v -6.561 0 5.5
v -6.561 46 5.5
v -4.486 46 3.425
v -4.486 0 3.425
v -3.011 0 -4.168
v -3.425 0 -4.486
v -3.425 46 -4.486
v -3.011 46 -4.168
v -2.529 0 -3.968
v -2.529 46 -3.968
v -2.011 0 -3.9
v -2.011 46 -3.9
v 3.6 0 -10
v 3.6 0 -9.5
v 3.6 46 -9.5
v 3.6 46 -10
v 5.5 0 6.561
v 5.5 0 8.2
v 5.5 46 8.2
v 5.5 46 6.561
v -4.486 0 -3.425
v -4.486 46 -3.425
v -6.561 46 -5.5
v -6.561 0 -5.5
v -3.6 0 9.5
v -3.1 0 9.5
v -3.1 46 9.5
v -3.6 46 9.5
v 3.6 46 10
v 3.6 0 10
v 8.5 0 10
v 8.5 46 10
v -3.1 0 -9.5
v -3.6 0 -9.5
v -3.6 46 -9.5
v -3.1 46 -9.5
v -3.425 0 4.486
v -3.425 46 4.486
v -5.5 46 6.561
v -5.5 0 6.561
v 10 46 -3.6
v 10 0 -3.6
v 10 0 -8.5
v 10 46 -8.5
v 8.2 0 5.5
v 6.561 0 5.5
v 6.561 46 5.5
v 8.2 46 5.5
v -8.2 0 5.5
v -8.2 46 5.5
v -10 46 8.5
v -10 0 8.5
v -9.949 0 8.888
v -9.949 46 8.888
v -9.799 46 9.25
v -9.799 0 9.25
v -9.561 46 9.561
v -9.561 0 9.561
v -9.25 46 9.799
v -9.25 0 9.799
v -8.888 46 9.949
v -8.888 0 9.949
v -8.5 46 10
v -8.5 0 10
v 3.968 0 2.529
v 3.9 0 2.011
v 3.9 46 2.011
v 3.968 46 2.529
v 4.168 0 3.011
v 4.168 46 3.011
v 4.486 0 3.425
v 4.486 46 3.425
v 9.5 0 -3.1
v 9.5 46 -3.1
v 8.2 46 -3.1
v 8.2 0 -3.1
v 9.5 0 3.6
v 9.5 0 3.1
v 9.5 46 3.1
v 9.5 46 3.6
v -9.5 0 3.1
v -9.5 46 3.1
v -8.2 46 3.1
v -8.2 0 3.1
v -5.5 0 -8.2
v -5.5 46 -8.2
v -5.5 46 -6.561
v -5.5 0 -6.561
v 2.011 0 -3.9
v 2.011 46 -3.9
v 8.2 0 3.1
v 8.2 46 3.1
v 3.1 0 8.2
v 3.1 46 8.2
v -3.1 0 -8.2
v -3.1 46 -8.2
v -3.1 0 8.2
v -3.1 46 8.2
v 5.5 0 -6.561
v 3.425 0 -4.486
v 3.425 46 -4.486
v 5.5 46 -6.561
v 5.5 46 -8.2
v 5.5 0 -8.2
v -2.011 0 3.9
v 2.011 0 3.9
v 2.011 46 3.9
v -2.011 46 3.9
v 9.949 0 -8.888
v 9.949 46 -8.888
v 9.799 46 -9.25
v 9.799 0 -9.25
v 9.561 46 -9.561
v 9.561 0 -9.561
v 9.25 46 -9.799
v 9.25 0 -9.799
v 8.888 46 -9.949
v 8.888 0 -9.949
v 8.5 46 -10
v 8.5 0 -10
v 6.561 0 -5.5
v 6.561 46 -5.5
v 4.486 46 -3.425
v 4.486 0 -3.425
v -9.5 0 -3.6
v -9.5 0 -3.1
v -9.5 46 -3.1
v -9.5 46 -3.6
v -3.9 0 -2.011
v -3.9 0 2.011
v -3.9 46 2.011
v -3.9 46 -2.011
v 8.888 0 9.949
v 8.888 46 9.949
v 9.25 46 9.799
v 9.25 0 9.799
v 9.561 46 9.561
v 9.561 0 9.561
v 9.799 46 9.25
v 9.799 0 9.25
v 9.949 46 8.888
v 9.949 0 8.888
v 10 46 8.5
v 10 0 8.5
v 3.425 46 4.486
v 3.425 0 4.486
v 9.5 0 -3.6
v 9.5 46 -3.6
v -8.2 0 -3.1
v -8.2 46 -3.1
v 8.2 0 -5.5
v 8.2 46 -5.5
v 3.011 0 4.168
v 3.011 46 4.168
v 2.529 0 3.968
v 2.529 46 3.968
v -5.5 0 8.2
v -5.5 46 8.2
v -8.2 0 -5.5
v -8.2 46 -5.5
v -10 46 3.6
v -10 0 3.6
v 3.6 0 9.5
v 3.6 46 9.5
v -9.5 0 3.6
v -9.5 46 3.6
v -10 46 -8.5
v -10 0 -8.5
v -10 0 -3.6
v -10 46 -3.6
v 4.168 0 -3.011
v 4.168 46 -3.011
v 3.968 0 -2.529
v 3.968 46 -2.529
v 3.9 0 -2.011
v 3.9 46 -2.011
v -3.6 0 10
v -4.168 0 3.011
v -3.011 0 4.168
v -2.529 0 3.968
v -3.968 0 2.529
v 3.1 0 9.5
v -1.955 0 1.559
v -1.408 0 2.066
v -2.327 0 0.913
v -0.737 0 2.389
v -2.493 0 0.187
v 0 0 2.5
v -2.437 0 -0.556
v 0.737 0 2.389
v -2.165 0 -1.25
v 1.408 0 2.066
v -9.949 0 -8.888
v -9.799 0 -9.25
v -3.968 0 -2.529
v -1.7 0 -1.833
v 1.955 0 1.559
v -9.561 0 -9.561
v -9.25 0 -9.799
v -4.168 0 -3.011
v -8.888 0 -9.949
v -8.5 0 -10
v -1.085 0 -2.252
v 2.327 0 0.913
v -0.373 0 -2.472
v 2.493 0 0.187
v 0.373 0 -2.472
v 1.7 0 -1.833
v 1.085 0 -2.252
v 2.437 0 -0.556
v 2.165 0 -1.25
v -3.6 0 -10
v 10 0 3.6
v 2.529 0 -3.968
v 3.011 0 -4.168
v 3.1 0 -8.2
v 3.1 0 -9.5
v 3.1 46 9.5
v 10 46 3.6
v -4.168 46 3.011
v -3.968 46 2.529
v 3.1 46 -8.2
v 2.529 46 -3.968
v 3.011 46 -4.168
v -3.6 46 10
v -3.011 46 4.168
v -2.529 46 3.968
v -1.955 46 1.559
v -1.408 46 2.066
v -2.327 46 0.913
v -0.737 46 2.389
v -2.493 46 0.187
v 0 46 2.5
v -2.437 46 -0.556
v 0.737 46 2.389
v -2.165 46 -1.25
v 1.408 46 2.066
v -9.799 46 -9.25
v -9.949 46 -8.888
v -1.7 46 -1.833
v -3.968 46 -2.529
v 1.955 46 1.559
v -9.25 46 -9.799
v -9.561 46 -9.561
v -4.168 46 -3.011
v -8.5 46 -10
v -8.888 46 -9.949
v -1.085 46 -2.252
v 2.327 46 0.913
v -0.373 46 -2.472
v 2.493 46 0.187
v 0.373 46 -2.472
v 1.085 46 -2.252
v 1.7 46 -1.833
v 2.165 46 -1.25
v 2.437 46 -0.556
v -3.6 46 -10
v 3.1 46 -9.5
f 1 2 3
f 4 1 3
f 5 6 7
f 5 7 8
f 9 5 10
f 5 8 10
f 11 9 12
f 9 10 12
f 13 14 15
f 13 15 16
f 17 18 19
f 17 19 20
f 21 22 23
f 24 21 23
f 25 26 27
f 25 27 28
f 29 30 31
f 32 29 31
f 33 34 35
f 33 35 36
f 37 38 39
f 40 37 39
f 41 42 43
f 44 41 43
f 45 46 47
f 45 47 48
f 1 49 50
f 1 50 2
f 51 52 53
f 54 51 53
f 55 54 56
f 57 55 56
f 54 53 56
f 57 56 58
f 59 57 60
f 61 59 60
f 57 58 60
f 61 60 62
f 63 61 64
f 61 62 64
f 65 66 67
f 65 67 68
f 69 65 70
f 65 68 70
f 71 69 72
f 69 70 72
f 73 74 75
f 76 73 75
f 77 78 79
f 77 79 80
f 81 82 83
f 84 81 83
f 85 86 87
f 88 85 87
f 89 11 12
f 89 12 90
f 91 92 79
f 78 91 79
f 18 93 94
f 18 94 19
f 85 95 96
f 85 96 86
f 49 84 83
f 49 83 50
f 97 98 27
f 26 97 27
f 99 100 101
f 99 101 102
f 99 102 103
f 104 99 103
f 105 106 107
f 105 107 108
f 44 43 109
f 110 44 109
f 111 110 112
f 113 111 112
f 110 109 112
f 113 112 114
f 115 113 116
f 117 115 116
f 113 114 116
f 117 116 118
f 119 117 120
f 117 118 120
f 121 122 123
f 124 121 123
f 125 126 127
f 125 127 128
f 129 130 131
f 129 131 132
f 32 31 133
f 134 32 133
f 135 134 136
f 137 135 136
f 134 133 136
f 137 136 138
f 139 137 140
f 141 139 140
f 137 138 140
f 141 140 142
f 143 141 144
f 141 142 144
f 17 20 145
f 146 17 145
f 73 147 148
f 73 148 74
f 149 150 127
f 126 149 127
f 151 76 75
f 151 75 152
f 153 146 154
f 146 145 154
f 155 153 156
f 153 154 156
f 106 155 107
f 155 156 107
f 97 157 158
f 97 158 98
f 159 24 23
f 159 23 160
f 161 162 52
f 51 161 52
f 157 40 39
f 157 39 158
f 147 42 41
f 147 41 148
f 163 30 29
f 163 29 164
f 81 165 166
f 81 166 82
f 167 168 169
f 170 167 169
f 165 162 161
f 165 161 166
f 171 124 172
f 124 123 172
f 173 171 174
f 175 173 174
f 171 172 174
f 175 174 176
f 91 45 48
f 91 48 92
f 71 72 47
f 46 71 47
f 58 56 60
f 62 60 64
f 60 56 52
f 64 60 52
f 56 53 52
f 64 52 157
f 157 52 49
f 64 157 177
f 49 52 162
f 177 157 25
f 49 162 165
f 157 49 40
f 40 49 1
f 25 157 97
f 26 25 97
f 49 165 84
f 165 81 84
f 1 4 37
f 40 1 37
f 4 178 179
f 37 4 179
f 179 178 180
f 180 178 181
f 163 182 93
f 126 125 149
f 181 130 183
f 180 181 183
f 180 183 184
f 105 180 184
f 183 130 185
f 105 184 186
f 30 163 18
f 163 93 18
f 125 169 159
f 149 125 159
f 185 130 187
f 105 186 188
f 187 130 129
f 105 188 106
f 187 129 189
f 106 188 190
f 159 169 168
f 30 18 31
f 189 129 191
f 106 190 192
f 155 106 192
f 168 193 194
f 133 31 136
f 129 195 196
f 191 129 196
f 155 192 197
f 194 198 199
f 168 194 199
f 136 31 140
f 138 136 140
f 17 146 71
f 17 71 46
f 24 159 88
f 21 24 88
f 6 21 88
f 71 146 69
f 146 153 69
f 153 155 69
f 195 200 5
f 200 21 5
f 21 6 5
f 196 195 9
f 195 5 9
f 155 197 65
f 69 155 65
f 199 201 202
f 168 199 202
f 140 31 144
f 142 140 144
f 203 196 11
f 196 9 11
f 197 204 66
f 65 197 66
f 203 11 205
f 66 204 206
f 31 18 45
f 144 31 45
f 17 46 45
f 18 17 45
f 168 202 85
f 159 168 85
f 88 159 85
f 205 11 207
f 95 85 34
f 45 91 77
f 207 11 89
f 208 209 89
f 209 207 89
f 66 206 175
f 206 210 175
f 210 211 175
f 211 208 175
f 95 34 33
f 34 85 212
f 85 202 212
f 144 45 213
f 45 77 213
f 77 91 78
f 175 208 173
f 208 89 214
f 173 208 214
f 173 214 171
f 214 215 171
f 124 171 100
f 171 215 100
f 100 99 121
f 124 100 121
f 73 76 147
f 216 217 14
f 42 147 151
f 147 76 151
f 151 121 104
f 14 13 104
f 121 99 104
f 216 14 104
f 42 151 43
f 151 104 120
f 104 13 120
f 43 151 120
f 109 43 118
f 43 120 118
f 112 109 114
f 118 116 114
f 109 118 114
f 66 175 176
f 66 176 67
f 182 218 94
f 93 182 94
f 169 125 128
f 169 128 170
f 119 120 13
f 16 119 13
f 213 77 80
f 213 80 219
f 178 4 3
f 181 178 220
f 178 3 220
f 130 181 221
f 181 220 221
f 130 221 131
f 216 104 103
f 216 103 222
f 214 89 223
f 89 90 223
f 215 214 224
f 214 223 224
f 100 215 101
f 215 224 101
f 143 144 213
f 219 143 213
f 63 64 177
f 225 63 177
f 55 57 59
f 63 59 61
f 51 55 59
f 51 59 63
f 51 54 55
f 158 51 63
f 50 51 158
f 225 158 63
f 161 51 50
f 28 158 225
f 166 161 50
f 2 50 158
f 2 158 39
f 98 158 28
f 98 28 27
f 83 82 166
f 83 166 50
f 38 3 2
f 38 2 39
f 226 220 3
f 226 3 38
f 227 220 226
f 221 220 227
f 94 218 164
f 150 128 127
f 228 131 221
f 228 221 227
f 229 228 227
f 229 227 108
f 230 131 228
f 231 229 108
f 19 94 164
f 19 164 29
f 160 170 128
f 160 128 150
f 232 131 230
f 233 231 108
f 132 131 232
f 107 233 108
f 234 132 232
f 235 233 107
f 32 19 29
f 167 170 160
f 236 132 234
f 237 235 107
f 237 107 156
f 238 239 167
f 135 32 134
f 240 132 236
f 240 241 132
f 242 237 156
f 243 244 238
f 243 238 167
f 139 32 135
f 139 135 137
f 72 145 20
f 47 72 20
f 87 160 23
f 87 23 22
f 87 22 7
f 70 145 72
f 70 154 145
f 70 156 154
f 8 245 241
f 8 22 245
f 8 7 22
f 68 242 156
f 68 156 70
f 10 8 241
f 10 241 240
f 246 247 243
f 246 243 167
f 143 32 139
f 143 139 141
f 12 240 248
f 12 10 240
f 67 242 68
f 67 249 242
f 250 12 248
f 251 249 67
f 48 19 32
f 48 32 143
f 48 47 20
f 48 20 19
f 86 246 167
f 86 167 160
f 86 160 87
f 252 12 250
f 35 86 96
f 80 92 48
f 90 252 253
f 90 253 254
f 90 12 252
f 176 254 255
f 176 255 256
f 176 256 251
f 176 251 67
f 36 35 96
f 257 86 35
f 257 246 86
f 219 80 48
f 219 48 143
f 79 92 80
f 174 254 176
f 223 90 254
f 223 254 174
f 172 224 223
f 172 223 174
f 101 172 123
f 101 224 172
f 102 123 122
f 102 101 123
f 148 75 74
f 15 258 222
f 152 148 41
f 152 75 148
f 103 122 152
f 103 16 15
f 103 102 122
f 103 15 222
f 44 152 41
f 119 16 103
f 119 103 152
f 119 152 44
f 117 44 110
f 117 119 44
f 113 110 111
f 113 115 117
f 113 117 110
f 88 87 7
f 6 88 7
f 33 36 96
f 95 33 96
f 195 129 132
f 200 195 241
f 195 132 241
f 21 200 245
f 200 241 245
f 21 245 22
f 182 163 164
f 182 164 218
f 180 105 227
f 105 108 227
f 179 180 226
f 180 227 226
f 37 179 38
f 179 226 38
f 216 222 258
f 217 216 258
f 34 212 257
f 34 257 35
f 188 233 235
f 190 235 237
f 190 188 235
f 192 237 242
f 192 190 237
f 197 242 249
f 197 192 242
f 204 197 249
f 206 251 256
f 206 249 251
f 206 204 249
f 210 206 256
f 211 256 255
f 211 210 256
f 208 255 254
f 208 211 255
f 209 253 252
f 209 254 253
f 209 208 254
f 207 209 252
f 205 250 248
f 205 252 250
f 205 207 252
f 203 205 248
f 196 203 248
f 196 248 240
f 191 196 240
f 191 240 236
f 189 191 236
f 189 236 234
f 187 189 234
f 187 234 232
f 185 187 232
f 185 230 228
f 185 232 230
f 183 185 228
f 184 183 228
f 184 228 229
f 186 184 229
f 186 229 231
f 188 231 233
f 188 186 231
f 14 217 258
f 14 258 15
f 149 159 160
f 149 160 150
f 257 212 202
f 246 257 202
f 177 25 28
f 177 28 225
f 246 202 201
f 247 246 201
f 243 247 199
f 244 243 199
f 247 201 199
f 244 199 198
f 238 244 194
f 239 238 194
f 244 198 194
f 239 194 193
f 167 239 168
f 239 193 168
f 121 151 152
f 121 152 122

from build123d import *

# Parameters (mm, degrees)
BOSS_EXTRUDE1_DEPTH      = 46
SKETCH4_R                = 2.5
CUT_EXTRUDE2_DEPTH       = 49.124837662
CUT_EXTRUDE1_DEPTH       = 49.124837662
FILLET1_R                = 2
CIRPATTERN1_COUNT        = 4
FILLET1_OF_CIRPATTERN1_R = 2


with BuildPart() as part:
    # Sketch1 → Boss-Extrude1 (new body)
    with BuildSketch(Plane(origin=(0, 0, 0), x_dir=(1, 0, 0), z_dir=(0, 1, 0))):
        with BuildLine():
            Line((8.5, 10), (-8.5, 10))
            ThreePointArc((-8.5, 10), (-9.560660172, 9.560660172), (-10, 8.5))
            Line((-10, 8.5), (-10, -8.5))
            ThreePointArc((-10, -8.5), (-9.560660172, -9.560660172), (-8.5, -10))
            Line((-8.5, -10), (8.5, -10))
            ThreePointArc((8.5, -10), (9.560660172, -9.560660172), (10, -8.5))
            Line((10, -8.5), (10, 8.5))
            ThreePointArc((10, 8.5), (9.560660172, 9.560660172), (8.5, 10))
        make_face()
    extrude(amount=BOSS_EXTRUDE1_DEPTH)

    # Sketch4 → Cut-Extrude2 (cut, through all)
    with BuildSketch(Plane(origin=(0, 0, 0), x_dir=(1, 0, 0), z_dir=(0, 1, 0))):
        with Locations(Location((0, 0, 0), (0, 0, 270))):
            Circle(SKETCH4_R)
    extrude(amount=CUT_EXTRUDE2_DEPTH, mode=Mode.SUBTRACT)

    # Sketch2 → Cut-Extrude1 (cut, through all)
    with BuildSketch(Plane.XZ):
        Polygon((-3.6, -10), (-3.6, -9.5), (-3.1, -9.5), (-3.1, -8.2), (-5.5, -8.2), (-5.5, -6.560660172), (-2.839339828, -3.9), (2.839339828, -3.9), (5.5, -6.560660172), (5.5, -8.2), (3.1, -8.2), (3.1, -9.5), (3.6, -9.5), (3.6, -10), align=None)
    cut_extrude1 = extrude(amount=-CUT_EXTRUDE1_DEPTH, mode=Mode.SUBTRACT)

    # Fillet1
    fillet1_edges = [part.edges().sort_by_distance(p)[0] for p in [
        (-2.839339828, 23, -3.9),
        (2.839339828, 23, -3.9),
    ]]
    fillet(fillet1_edges, radius=FILLET1_R)

    # CirPattern1: Cut-Extrude1 ×4 about axis
    cirpattern1_axis = Axis((0, 0, 0), (0, 1, 0))
    for i in range(1, CIRPATTERN1_COUNT):
        add(cut_extrude1.rotate(cirpattern1_axis, i * 360 / CIRPATTERN1_COUNT), mode=Mode.SUBTRACT)

    # Fillet1 of CirPattern1
    fillet1_of_cirpattern1_edges = [part.edges().sort_by_distance(p)[0] for p in [
        (-3.9, 23, 2.839339828),
        (-3.9, 23, -2.839339828),
        (2.839339828, 23, 3.9),
        (-2.839339828, 23, 3.9),
        (3.9, 23, -2.839339828),
        (3.9, 23, 2.839339828),
    ]]
    fillet(fillet1_of_cirpattern1_edges, radius=FILLET1_OF_CIRPATTERN1_R)


solid = part.part
